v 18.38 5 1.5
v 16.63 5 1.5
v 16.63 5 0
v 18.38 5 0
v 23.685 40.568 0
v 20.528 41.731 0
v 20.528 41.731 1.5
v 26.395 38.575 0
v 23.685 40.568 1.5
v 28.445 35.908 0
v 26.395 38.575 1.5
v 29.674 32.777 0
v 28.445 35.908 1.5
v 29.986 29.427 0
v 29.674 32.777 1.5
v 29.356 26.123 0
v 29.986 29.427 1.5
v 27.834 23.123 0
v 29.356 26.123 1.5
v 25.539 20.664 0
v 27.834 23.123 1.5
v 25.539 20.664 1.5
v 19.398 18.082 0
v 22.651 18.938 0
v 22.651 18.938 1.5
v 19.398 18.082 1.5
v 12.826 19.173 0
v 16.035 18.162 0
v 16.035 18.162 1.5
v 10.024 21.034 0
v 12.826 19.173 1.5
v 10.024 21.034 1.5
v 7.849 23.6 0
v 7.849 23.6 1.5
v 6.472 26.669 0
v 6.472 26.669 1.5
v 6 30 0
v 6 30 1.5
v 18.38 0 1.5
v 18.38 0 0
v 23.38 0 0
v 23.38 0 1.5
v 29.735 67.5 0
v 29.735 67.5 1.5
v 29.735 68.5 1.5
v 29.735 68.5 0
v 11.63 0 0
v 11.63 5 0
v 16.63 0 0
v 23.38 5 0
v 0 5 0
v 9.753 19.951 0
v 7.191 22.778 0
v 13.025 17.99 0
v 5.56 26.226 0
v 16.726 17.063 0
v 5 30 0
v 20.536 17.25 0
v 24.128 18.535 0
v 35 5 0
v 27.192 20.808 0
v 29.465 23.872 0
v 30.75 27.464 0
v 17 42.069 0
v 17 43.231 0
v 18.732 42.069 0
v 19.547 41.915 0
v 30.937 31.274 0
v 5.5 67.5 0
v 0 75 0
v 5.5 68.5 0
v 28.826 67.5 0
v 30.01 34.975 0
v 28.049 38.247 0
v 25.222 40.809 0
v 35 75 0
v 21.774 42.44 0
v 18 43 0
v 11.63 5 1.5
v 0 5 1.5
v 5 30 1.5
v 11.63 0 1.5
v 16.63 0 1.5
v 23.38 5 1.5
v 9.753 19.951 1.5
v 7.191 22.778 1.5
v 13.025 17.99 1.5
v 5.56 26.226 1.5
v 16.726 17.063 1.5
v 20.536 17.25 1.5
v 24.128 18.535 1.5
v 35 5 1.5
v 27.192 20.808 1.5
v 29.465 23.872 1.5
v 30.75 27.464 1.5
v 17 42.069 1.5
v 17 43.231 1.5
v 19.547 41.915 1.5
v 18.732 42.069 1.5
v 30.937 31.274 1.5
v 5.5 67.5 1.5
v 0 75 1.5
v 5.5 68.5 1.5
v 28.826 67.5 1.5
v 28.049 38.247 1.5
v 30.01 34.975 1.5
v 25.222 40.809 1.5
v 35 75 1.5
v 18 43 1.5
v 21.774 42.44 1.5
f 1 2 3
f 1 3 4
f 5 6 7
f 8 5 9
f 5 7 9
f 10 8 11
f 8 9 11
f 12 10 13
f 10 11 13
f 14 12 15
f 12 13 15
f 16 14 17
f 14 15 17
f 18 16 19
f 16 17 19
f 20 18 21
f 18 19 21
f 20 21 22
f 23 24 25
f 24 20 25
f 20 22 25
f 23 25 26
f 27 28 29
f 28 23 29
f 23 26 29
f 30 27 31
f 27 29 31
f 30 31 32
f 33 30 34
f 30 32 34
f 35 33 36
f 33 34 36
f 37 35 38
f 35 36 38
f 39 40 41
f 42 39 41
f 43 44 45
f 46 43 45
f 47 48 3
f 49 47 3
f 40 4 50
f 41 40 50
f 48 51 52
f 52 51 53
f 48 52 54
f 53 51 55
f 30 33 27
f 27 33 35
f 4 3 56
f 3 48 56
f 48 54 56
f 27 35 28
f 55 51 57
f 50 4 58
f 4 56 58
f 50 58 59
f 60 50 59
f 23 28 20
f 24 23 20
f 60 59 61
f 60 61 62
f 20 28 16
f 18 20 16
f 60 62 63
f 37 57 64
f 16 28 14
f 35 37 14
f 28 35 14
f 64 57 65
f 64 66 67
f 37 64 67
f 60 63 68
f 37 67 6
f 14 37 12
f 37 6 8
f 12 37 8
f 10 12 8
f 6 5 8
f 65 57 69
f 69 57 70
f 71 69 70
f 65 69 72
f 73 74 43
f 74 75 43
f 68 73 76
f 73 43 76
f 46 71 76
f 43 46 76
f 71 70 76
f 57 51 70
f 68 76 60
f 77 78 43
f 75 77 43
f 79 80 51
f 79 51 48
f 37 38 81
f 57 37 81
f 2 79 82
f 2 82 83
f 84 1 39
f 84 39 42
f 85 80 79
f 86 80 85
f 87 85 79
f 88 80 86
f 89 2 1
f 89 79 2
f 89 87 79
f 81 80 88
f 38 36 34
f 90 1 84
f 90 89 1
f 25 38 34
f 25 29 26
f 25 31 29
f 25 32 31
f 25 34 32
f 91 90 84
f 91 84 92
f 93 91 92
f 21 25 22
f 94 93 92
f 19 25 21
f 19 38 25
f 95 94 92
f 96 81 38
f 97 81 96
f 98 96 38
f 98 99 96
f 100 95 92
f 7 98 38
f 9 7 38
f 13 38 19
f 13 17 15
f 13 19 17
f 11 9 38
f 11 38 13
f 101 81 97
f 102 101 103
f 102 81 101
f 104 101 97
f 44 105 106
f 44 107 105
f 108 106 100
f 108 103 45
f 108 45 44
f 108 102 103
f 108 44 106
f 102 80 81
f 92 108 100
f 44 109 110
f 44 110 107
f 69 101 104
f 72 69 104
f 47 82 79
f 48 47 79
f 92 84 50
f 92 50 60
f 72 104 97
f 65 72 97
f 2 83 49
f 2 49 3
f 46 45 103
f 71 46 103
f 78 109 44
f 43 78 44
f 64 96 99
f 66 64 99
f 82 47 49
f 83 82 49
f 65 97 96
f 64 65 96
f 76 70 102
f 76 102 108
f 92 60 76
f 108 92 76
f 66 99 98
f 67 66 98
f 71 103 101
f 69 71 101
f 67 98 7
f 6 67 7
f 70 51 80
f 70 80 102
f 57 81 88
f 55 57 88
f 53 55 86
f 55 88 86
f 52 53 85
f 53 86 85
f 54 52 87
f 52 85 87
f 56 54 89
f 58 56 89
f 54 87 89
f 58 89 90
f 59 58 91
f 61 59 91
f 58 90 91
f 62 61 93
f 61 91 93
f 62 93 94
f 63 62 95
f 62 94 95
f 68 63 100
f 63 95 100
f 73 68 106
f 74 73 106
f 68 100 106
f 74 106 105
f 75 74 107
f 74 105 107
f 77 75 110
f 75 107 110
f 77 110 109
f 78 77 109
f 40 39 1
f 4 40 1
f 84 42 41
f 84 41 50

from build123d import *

# Parameters (mm, degrees)
SKIZZE1_W                       = 35
SKIZZE1_H                       = 75
AUFSATZ_LINEAR_AUSTRAGEN1_DEPTH = 1.5
SKIZZE2_W                       = 11.63
SKIZZE2_H                       = 5
SKIZZE2_W_2                     = 11.62
SKIZZE2_W_3                     = 1.75
SCHNITT_LINEAR_AUSTRAGEN1_DEPTH = 1.5
SCHNITT_LINEAR_AUSTRAGEN4_DEPTH = 20


with BuildPart() as part:
    # Skizze1 → Aufsatz-Linear austragen1 (new body)
    with BuildSketch(Plane.XY):
        with Locations((17.5, 37.5)):
            Rectangle(SKIZZE1_W, SKIZZE1_H)
    extrude(amount=AUFSATZ_LINEAR_AUSTRAGEN1_DEPTH)

    # Skizze2 → Schnitt-Linear austragen1 (cut)
    with BuildSketch(Plane.XY.offset(1.5)):
        with Locations((5.815, 2.5)):
            Rectangle(SKIZZE2_W, SKIZZE2_H)
        with Locations((29.19, 2.5)):
            Rectangle(SKIZZE2_W_2, SKIZZE2_H)
        with Locations((17.505, 2.5)):
            Rectangle(SKIZZE2_W_3, SKIZZE2_H)
    extrude(amount=-SCHNITT_LINEAR_AUSTRAGEN1_DEPTH, mode=Mode.SUBTRACT)

    # Skizze9 → Schnitt-Linear austragen4 (cut)
    with BuildSketch(Plane.XY.offset(1.5)):
        with BuildLine():
            Line((18, 43), (29.734930419, 67.5))
            Line((29.734930419, 67.5), (29.734930419, 68.5))
            Line((29.734930419, 68.5), (5.5, 68.5))
            Line((5.5, 68.5), (5.5, 67.5))
            Line((5.5, 67.5), (28.826499189, 67.5))
            Line((28.826499189, 67.5), (17, 43.230685214))
            Line((17, 43.230685214), (17, 42.069041261))
            Line((17, 42.069041261), (18.731597041, 42.069041261))
            Line((18.731597041, 42.069041261), (19.547222411, 41.915420677))
            Line((19.547222411, 41.915420677), (20.52804755, 41.730685214))
            ThreePointArc((20.52804755, 41.730685214), (25.538681231, 20.663604266), (6, 30))
            Line((6, 30), (5, 30))
            ThreePointArc((5, 30), (27.192388155, 20.807611845), (18, 43))
        make_face()
    extrude(amount=-SCHNITT_LINEAR_AUSTRAGEN4_DEPTH, mode=Mode.SUBTRACT)


solid = part.part
